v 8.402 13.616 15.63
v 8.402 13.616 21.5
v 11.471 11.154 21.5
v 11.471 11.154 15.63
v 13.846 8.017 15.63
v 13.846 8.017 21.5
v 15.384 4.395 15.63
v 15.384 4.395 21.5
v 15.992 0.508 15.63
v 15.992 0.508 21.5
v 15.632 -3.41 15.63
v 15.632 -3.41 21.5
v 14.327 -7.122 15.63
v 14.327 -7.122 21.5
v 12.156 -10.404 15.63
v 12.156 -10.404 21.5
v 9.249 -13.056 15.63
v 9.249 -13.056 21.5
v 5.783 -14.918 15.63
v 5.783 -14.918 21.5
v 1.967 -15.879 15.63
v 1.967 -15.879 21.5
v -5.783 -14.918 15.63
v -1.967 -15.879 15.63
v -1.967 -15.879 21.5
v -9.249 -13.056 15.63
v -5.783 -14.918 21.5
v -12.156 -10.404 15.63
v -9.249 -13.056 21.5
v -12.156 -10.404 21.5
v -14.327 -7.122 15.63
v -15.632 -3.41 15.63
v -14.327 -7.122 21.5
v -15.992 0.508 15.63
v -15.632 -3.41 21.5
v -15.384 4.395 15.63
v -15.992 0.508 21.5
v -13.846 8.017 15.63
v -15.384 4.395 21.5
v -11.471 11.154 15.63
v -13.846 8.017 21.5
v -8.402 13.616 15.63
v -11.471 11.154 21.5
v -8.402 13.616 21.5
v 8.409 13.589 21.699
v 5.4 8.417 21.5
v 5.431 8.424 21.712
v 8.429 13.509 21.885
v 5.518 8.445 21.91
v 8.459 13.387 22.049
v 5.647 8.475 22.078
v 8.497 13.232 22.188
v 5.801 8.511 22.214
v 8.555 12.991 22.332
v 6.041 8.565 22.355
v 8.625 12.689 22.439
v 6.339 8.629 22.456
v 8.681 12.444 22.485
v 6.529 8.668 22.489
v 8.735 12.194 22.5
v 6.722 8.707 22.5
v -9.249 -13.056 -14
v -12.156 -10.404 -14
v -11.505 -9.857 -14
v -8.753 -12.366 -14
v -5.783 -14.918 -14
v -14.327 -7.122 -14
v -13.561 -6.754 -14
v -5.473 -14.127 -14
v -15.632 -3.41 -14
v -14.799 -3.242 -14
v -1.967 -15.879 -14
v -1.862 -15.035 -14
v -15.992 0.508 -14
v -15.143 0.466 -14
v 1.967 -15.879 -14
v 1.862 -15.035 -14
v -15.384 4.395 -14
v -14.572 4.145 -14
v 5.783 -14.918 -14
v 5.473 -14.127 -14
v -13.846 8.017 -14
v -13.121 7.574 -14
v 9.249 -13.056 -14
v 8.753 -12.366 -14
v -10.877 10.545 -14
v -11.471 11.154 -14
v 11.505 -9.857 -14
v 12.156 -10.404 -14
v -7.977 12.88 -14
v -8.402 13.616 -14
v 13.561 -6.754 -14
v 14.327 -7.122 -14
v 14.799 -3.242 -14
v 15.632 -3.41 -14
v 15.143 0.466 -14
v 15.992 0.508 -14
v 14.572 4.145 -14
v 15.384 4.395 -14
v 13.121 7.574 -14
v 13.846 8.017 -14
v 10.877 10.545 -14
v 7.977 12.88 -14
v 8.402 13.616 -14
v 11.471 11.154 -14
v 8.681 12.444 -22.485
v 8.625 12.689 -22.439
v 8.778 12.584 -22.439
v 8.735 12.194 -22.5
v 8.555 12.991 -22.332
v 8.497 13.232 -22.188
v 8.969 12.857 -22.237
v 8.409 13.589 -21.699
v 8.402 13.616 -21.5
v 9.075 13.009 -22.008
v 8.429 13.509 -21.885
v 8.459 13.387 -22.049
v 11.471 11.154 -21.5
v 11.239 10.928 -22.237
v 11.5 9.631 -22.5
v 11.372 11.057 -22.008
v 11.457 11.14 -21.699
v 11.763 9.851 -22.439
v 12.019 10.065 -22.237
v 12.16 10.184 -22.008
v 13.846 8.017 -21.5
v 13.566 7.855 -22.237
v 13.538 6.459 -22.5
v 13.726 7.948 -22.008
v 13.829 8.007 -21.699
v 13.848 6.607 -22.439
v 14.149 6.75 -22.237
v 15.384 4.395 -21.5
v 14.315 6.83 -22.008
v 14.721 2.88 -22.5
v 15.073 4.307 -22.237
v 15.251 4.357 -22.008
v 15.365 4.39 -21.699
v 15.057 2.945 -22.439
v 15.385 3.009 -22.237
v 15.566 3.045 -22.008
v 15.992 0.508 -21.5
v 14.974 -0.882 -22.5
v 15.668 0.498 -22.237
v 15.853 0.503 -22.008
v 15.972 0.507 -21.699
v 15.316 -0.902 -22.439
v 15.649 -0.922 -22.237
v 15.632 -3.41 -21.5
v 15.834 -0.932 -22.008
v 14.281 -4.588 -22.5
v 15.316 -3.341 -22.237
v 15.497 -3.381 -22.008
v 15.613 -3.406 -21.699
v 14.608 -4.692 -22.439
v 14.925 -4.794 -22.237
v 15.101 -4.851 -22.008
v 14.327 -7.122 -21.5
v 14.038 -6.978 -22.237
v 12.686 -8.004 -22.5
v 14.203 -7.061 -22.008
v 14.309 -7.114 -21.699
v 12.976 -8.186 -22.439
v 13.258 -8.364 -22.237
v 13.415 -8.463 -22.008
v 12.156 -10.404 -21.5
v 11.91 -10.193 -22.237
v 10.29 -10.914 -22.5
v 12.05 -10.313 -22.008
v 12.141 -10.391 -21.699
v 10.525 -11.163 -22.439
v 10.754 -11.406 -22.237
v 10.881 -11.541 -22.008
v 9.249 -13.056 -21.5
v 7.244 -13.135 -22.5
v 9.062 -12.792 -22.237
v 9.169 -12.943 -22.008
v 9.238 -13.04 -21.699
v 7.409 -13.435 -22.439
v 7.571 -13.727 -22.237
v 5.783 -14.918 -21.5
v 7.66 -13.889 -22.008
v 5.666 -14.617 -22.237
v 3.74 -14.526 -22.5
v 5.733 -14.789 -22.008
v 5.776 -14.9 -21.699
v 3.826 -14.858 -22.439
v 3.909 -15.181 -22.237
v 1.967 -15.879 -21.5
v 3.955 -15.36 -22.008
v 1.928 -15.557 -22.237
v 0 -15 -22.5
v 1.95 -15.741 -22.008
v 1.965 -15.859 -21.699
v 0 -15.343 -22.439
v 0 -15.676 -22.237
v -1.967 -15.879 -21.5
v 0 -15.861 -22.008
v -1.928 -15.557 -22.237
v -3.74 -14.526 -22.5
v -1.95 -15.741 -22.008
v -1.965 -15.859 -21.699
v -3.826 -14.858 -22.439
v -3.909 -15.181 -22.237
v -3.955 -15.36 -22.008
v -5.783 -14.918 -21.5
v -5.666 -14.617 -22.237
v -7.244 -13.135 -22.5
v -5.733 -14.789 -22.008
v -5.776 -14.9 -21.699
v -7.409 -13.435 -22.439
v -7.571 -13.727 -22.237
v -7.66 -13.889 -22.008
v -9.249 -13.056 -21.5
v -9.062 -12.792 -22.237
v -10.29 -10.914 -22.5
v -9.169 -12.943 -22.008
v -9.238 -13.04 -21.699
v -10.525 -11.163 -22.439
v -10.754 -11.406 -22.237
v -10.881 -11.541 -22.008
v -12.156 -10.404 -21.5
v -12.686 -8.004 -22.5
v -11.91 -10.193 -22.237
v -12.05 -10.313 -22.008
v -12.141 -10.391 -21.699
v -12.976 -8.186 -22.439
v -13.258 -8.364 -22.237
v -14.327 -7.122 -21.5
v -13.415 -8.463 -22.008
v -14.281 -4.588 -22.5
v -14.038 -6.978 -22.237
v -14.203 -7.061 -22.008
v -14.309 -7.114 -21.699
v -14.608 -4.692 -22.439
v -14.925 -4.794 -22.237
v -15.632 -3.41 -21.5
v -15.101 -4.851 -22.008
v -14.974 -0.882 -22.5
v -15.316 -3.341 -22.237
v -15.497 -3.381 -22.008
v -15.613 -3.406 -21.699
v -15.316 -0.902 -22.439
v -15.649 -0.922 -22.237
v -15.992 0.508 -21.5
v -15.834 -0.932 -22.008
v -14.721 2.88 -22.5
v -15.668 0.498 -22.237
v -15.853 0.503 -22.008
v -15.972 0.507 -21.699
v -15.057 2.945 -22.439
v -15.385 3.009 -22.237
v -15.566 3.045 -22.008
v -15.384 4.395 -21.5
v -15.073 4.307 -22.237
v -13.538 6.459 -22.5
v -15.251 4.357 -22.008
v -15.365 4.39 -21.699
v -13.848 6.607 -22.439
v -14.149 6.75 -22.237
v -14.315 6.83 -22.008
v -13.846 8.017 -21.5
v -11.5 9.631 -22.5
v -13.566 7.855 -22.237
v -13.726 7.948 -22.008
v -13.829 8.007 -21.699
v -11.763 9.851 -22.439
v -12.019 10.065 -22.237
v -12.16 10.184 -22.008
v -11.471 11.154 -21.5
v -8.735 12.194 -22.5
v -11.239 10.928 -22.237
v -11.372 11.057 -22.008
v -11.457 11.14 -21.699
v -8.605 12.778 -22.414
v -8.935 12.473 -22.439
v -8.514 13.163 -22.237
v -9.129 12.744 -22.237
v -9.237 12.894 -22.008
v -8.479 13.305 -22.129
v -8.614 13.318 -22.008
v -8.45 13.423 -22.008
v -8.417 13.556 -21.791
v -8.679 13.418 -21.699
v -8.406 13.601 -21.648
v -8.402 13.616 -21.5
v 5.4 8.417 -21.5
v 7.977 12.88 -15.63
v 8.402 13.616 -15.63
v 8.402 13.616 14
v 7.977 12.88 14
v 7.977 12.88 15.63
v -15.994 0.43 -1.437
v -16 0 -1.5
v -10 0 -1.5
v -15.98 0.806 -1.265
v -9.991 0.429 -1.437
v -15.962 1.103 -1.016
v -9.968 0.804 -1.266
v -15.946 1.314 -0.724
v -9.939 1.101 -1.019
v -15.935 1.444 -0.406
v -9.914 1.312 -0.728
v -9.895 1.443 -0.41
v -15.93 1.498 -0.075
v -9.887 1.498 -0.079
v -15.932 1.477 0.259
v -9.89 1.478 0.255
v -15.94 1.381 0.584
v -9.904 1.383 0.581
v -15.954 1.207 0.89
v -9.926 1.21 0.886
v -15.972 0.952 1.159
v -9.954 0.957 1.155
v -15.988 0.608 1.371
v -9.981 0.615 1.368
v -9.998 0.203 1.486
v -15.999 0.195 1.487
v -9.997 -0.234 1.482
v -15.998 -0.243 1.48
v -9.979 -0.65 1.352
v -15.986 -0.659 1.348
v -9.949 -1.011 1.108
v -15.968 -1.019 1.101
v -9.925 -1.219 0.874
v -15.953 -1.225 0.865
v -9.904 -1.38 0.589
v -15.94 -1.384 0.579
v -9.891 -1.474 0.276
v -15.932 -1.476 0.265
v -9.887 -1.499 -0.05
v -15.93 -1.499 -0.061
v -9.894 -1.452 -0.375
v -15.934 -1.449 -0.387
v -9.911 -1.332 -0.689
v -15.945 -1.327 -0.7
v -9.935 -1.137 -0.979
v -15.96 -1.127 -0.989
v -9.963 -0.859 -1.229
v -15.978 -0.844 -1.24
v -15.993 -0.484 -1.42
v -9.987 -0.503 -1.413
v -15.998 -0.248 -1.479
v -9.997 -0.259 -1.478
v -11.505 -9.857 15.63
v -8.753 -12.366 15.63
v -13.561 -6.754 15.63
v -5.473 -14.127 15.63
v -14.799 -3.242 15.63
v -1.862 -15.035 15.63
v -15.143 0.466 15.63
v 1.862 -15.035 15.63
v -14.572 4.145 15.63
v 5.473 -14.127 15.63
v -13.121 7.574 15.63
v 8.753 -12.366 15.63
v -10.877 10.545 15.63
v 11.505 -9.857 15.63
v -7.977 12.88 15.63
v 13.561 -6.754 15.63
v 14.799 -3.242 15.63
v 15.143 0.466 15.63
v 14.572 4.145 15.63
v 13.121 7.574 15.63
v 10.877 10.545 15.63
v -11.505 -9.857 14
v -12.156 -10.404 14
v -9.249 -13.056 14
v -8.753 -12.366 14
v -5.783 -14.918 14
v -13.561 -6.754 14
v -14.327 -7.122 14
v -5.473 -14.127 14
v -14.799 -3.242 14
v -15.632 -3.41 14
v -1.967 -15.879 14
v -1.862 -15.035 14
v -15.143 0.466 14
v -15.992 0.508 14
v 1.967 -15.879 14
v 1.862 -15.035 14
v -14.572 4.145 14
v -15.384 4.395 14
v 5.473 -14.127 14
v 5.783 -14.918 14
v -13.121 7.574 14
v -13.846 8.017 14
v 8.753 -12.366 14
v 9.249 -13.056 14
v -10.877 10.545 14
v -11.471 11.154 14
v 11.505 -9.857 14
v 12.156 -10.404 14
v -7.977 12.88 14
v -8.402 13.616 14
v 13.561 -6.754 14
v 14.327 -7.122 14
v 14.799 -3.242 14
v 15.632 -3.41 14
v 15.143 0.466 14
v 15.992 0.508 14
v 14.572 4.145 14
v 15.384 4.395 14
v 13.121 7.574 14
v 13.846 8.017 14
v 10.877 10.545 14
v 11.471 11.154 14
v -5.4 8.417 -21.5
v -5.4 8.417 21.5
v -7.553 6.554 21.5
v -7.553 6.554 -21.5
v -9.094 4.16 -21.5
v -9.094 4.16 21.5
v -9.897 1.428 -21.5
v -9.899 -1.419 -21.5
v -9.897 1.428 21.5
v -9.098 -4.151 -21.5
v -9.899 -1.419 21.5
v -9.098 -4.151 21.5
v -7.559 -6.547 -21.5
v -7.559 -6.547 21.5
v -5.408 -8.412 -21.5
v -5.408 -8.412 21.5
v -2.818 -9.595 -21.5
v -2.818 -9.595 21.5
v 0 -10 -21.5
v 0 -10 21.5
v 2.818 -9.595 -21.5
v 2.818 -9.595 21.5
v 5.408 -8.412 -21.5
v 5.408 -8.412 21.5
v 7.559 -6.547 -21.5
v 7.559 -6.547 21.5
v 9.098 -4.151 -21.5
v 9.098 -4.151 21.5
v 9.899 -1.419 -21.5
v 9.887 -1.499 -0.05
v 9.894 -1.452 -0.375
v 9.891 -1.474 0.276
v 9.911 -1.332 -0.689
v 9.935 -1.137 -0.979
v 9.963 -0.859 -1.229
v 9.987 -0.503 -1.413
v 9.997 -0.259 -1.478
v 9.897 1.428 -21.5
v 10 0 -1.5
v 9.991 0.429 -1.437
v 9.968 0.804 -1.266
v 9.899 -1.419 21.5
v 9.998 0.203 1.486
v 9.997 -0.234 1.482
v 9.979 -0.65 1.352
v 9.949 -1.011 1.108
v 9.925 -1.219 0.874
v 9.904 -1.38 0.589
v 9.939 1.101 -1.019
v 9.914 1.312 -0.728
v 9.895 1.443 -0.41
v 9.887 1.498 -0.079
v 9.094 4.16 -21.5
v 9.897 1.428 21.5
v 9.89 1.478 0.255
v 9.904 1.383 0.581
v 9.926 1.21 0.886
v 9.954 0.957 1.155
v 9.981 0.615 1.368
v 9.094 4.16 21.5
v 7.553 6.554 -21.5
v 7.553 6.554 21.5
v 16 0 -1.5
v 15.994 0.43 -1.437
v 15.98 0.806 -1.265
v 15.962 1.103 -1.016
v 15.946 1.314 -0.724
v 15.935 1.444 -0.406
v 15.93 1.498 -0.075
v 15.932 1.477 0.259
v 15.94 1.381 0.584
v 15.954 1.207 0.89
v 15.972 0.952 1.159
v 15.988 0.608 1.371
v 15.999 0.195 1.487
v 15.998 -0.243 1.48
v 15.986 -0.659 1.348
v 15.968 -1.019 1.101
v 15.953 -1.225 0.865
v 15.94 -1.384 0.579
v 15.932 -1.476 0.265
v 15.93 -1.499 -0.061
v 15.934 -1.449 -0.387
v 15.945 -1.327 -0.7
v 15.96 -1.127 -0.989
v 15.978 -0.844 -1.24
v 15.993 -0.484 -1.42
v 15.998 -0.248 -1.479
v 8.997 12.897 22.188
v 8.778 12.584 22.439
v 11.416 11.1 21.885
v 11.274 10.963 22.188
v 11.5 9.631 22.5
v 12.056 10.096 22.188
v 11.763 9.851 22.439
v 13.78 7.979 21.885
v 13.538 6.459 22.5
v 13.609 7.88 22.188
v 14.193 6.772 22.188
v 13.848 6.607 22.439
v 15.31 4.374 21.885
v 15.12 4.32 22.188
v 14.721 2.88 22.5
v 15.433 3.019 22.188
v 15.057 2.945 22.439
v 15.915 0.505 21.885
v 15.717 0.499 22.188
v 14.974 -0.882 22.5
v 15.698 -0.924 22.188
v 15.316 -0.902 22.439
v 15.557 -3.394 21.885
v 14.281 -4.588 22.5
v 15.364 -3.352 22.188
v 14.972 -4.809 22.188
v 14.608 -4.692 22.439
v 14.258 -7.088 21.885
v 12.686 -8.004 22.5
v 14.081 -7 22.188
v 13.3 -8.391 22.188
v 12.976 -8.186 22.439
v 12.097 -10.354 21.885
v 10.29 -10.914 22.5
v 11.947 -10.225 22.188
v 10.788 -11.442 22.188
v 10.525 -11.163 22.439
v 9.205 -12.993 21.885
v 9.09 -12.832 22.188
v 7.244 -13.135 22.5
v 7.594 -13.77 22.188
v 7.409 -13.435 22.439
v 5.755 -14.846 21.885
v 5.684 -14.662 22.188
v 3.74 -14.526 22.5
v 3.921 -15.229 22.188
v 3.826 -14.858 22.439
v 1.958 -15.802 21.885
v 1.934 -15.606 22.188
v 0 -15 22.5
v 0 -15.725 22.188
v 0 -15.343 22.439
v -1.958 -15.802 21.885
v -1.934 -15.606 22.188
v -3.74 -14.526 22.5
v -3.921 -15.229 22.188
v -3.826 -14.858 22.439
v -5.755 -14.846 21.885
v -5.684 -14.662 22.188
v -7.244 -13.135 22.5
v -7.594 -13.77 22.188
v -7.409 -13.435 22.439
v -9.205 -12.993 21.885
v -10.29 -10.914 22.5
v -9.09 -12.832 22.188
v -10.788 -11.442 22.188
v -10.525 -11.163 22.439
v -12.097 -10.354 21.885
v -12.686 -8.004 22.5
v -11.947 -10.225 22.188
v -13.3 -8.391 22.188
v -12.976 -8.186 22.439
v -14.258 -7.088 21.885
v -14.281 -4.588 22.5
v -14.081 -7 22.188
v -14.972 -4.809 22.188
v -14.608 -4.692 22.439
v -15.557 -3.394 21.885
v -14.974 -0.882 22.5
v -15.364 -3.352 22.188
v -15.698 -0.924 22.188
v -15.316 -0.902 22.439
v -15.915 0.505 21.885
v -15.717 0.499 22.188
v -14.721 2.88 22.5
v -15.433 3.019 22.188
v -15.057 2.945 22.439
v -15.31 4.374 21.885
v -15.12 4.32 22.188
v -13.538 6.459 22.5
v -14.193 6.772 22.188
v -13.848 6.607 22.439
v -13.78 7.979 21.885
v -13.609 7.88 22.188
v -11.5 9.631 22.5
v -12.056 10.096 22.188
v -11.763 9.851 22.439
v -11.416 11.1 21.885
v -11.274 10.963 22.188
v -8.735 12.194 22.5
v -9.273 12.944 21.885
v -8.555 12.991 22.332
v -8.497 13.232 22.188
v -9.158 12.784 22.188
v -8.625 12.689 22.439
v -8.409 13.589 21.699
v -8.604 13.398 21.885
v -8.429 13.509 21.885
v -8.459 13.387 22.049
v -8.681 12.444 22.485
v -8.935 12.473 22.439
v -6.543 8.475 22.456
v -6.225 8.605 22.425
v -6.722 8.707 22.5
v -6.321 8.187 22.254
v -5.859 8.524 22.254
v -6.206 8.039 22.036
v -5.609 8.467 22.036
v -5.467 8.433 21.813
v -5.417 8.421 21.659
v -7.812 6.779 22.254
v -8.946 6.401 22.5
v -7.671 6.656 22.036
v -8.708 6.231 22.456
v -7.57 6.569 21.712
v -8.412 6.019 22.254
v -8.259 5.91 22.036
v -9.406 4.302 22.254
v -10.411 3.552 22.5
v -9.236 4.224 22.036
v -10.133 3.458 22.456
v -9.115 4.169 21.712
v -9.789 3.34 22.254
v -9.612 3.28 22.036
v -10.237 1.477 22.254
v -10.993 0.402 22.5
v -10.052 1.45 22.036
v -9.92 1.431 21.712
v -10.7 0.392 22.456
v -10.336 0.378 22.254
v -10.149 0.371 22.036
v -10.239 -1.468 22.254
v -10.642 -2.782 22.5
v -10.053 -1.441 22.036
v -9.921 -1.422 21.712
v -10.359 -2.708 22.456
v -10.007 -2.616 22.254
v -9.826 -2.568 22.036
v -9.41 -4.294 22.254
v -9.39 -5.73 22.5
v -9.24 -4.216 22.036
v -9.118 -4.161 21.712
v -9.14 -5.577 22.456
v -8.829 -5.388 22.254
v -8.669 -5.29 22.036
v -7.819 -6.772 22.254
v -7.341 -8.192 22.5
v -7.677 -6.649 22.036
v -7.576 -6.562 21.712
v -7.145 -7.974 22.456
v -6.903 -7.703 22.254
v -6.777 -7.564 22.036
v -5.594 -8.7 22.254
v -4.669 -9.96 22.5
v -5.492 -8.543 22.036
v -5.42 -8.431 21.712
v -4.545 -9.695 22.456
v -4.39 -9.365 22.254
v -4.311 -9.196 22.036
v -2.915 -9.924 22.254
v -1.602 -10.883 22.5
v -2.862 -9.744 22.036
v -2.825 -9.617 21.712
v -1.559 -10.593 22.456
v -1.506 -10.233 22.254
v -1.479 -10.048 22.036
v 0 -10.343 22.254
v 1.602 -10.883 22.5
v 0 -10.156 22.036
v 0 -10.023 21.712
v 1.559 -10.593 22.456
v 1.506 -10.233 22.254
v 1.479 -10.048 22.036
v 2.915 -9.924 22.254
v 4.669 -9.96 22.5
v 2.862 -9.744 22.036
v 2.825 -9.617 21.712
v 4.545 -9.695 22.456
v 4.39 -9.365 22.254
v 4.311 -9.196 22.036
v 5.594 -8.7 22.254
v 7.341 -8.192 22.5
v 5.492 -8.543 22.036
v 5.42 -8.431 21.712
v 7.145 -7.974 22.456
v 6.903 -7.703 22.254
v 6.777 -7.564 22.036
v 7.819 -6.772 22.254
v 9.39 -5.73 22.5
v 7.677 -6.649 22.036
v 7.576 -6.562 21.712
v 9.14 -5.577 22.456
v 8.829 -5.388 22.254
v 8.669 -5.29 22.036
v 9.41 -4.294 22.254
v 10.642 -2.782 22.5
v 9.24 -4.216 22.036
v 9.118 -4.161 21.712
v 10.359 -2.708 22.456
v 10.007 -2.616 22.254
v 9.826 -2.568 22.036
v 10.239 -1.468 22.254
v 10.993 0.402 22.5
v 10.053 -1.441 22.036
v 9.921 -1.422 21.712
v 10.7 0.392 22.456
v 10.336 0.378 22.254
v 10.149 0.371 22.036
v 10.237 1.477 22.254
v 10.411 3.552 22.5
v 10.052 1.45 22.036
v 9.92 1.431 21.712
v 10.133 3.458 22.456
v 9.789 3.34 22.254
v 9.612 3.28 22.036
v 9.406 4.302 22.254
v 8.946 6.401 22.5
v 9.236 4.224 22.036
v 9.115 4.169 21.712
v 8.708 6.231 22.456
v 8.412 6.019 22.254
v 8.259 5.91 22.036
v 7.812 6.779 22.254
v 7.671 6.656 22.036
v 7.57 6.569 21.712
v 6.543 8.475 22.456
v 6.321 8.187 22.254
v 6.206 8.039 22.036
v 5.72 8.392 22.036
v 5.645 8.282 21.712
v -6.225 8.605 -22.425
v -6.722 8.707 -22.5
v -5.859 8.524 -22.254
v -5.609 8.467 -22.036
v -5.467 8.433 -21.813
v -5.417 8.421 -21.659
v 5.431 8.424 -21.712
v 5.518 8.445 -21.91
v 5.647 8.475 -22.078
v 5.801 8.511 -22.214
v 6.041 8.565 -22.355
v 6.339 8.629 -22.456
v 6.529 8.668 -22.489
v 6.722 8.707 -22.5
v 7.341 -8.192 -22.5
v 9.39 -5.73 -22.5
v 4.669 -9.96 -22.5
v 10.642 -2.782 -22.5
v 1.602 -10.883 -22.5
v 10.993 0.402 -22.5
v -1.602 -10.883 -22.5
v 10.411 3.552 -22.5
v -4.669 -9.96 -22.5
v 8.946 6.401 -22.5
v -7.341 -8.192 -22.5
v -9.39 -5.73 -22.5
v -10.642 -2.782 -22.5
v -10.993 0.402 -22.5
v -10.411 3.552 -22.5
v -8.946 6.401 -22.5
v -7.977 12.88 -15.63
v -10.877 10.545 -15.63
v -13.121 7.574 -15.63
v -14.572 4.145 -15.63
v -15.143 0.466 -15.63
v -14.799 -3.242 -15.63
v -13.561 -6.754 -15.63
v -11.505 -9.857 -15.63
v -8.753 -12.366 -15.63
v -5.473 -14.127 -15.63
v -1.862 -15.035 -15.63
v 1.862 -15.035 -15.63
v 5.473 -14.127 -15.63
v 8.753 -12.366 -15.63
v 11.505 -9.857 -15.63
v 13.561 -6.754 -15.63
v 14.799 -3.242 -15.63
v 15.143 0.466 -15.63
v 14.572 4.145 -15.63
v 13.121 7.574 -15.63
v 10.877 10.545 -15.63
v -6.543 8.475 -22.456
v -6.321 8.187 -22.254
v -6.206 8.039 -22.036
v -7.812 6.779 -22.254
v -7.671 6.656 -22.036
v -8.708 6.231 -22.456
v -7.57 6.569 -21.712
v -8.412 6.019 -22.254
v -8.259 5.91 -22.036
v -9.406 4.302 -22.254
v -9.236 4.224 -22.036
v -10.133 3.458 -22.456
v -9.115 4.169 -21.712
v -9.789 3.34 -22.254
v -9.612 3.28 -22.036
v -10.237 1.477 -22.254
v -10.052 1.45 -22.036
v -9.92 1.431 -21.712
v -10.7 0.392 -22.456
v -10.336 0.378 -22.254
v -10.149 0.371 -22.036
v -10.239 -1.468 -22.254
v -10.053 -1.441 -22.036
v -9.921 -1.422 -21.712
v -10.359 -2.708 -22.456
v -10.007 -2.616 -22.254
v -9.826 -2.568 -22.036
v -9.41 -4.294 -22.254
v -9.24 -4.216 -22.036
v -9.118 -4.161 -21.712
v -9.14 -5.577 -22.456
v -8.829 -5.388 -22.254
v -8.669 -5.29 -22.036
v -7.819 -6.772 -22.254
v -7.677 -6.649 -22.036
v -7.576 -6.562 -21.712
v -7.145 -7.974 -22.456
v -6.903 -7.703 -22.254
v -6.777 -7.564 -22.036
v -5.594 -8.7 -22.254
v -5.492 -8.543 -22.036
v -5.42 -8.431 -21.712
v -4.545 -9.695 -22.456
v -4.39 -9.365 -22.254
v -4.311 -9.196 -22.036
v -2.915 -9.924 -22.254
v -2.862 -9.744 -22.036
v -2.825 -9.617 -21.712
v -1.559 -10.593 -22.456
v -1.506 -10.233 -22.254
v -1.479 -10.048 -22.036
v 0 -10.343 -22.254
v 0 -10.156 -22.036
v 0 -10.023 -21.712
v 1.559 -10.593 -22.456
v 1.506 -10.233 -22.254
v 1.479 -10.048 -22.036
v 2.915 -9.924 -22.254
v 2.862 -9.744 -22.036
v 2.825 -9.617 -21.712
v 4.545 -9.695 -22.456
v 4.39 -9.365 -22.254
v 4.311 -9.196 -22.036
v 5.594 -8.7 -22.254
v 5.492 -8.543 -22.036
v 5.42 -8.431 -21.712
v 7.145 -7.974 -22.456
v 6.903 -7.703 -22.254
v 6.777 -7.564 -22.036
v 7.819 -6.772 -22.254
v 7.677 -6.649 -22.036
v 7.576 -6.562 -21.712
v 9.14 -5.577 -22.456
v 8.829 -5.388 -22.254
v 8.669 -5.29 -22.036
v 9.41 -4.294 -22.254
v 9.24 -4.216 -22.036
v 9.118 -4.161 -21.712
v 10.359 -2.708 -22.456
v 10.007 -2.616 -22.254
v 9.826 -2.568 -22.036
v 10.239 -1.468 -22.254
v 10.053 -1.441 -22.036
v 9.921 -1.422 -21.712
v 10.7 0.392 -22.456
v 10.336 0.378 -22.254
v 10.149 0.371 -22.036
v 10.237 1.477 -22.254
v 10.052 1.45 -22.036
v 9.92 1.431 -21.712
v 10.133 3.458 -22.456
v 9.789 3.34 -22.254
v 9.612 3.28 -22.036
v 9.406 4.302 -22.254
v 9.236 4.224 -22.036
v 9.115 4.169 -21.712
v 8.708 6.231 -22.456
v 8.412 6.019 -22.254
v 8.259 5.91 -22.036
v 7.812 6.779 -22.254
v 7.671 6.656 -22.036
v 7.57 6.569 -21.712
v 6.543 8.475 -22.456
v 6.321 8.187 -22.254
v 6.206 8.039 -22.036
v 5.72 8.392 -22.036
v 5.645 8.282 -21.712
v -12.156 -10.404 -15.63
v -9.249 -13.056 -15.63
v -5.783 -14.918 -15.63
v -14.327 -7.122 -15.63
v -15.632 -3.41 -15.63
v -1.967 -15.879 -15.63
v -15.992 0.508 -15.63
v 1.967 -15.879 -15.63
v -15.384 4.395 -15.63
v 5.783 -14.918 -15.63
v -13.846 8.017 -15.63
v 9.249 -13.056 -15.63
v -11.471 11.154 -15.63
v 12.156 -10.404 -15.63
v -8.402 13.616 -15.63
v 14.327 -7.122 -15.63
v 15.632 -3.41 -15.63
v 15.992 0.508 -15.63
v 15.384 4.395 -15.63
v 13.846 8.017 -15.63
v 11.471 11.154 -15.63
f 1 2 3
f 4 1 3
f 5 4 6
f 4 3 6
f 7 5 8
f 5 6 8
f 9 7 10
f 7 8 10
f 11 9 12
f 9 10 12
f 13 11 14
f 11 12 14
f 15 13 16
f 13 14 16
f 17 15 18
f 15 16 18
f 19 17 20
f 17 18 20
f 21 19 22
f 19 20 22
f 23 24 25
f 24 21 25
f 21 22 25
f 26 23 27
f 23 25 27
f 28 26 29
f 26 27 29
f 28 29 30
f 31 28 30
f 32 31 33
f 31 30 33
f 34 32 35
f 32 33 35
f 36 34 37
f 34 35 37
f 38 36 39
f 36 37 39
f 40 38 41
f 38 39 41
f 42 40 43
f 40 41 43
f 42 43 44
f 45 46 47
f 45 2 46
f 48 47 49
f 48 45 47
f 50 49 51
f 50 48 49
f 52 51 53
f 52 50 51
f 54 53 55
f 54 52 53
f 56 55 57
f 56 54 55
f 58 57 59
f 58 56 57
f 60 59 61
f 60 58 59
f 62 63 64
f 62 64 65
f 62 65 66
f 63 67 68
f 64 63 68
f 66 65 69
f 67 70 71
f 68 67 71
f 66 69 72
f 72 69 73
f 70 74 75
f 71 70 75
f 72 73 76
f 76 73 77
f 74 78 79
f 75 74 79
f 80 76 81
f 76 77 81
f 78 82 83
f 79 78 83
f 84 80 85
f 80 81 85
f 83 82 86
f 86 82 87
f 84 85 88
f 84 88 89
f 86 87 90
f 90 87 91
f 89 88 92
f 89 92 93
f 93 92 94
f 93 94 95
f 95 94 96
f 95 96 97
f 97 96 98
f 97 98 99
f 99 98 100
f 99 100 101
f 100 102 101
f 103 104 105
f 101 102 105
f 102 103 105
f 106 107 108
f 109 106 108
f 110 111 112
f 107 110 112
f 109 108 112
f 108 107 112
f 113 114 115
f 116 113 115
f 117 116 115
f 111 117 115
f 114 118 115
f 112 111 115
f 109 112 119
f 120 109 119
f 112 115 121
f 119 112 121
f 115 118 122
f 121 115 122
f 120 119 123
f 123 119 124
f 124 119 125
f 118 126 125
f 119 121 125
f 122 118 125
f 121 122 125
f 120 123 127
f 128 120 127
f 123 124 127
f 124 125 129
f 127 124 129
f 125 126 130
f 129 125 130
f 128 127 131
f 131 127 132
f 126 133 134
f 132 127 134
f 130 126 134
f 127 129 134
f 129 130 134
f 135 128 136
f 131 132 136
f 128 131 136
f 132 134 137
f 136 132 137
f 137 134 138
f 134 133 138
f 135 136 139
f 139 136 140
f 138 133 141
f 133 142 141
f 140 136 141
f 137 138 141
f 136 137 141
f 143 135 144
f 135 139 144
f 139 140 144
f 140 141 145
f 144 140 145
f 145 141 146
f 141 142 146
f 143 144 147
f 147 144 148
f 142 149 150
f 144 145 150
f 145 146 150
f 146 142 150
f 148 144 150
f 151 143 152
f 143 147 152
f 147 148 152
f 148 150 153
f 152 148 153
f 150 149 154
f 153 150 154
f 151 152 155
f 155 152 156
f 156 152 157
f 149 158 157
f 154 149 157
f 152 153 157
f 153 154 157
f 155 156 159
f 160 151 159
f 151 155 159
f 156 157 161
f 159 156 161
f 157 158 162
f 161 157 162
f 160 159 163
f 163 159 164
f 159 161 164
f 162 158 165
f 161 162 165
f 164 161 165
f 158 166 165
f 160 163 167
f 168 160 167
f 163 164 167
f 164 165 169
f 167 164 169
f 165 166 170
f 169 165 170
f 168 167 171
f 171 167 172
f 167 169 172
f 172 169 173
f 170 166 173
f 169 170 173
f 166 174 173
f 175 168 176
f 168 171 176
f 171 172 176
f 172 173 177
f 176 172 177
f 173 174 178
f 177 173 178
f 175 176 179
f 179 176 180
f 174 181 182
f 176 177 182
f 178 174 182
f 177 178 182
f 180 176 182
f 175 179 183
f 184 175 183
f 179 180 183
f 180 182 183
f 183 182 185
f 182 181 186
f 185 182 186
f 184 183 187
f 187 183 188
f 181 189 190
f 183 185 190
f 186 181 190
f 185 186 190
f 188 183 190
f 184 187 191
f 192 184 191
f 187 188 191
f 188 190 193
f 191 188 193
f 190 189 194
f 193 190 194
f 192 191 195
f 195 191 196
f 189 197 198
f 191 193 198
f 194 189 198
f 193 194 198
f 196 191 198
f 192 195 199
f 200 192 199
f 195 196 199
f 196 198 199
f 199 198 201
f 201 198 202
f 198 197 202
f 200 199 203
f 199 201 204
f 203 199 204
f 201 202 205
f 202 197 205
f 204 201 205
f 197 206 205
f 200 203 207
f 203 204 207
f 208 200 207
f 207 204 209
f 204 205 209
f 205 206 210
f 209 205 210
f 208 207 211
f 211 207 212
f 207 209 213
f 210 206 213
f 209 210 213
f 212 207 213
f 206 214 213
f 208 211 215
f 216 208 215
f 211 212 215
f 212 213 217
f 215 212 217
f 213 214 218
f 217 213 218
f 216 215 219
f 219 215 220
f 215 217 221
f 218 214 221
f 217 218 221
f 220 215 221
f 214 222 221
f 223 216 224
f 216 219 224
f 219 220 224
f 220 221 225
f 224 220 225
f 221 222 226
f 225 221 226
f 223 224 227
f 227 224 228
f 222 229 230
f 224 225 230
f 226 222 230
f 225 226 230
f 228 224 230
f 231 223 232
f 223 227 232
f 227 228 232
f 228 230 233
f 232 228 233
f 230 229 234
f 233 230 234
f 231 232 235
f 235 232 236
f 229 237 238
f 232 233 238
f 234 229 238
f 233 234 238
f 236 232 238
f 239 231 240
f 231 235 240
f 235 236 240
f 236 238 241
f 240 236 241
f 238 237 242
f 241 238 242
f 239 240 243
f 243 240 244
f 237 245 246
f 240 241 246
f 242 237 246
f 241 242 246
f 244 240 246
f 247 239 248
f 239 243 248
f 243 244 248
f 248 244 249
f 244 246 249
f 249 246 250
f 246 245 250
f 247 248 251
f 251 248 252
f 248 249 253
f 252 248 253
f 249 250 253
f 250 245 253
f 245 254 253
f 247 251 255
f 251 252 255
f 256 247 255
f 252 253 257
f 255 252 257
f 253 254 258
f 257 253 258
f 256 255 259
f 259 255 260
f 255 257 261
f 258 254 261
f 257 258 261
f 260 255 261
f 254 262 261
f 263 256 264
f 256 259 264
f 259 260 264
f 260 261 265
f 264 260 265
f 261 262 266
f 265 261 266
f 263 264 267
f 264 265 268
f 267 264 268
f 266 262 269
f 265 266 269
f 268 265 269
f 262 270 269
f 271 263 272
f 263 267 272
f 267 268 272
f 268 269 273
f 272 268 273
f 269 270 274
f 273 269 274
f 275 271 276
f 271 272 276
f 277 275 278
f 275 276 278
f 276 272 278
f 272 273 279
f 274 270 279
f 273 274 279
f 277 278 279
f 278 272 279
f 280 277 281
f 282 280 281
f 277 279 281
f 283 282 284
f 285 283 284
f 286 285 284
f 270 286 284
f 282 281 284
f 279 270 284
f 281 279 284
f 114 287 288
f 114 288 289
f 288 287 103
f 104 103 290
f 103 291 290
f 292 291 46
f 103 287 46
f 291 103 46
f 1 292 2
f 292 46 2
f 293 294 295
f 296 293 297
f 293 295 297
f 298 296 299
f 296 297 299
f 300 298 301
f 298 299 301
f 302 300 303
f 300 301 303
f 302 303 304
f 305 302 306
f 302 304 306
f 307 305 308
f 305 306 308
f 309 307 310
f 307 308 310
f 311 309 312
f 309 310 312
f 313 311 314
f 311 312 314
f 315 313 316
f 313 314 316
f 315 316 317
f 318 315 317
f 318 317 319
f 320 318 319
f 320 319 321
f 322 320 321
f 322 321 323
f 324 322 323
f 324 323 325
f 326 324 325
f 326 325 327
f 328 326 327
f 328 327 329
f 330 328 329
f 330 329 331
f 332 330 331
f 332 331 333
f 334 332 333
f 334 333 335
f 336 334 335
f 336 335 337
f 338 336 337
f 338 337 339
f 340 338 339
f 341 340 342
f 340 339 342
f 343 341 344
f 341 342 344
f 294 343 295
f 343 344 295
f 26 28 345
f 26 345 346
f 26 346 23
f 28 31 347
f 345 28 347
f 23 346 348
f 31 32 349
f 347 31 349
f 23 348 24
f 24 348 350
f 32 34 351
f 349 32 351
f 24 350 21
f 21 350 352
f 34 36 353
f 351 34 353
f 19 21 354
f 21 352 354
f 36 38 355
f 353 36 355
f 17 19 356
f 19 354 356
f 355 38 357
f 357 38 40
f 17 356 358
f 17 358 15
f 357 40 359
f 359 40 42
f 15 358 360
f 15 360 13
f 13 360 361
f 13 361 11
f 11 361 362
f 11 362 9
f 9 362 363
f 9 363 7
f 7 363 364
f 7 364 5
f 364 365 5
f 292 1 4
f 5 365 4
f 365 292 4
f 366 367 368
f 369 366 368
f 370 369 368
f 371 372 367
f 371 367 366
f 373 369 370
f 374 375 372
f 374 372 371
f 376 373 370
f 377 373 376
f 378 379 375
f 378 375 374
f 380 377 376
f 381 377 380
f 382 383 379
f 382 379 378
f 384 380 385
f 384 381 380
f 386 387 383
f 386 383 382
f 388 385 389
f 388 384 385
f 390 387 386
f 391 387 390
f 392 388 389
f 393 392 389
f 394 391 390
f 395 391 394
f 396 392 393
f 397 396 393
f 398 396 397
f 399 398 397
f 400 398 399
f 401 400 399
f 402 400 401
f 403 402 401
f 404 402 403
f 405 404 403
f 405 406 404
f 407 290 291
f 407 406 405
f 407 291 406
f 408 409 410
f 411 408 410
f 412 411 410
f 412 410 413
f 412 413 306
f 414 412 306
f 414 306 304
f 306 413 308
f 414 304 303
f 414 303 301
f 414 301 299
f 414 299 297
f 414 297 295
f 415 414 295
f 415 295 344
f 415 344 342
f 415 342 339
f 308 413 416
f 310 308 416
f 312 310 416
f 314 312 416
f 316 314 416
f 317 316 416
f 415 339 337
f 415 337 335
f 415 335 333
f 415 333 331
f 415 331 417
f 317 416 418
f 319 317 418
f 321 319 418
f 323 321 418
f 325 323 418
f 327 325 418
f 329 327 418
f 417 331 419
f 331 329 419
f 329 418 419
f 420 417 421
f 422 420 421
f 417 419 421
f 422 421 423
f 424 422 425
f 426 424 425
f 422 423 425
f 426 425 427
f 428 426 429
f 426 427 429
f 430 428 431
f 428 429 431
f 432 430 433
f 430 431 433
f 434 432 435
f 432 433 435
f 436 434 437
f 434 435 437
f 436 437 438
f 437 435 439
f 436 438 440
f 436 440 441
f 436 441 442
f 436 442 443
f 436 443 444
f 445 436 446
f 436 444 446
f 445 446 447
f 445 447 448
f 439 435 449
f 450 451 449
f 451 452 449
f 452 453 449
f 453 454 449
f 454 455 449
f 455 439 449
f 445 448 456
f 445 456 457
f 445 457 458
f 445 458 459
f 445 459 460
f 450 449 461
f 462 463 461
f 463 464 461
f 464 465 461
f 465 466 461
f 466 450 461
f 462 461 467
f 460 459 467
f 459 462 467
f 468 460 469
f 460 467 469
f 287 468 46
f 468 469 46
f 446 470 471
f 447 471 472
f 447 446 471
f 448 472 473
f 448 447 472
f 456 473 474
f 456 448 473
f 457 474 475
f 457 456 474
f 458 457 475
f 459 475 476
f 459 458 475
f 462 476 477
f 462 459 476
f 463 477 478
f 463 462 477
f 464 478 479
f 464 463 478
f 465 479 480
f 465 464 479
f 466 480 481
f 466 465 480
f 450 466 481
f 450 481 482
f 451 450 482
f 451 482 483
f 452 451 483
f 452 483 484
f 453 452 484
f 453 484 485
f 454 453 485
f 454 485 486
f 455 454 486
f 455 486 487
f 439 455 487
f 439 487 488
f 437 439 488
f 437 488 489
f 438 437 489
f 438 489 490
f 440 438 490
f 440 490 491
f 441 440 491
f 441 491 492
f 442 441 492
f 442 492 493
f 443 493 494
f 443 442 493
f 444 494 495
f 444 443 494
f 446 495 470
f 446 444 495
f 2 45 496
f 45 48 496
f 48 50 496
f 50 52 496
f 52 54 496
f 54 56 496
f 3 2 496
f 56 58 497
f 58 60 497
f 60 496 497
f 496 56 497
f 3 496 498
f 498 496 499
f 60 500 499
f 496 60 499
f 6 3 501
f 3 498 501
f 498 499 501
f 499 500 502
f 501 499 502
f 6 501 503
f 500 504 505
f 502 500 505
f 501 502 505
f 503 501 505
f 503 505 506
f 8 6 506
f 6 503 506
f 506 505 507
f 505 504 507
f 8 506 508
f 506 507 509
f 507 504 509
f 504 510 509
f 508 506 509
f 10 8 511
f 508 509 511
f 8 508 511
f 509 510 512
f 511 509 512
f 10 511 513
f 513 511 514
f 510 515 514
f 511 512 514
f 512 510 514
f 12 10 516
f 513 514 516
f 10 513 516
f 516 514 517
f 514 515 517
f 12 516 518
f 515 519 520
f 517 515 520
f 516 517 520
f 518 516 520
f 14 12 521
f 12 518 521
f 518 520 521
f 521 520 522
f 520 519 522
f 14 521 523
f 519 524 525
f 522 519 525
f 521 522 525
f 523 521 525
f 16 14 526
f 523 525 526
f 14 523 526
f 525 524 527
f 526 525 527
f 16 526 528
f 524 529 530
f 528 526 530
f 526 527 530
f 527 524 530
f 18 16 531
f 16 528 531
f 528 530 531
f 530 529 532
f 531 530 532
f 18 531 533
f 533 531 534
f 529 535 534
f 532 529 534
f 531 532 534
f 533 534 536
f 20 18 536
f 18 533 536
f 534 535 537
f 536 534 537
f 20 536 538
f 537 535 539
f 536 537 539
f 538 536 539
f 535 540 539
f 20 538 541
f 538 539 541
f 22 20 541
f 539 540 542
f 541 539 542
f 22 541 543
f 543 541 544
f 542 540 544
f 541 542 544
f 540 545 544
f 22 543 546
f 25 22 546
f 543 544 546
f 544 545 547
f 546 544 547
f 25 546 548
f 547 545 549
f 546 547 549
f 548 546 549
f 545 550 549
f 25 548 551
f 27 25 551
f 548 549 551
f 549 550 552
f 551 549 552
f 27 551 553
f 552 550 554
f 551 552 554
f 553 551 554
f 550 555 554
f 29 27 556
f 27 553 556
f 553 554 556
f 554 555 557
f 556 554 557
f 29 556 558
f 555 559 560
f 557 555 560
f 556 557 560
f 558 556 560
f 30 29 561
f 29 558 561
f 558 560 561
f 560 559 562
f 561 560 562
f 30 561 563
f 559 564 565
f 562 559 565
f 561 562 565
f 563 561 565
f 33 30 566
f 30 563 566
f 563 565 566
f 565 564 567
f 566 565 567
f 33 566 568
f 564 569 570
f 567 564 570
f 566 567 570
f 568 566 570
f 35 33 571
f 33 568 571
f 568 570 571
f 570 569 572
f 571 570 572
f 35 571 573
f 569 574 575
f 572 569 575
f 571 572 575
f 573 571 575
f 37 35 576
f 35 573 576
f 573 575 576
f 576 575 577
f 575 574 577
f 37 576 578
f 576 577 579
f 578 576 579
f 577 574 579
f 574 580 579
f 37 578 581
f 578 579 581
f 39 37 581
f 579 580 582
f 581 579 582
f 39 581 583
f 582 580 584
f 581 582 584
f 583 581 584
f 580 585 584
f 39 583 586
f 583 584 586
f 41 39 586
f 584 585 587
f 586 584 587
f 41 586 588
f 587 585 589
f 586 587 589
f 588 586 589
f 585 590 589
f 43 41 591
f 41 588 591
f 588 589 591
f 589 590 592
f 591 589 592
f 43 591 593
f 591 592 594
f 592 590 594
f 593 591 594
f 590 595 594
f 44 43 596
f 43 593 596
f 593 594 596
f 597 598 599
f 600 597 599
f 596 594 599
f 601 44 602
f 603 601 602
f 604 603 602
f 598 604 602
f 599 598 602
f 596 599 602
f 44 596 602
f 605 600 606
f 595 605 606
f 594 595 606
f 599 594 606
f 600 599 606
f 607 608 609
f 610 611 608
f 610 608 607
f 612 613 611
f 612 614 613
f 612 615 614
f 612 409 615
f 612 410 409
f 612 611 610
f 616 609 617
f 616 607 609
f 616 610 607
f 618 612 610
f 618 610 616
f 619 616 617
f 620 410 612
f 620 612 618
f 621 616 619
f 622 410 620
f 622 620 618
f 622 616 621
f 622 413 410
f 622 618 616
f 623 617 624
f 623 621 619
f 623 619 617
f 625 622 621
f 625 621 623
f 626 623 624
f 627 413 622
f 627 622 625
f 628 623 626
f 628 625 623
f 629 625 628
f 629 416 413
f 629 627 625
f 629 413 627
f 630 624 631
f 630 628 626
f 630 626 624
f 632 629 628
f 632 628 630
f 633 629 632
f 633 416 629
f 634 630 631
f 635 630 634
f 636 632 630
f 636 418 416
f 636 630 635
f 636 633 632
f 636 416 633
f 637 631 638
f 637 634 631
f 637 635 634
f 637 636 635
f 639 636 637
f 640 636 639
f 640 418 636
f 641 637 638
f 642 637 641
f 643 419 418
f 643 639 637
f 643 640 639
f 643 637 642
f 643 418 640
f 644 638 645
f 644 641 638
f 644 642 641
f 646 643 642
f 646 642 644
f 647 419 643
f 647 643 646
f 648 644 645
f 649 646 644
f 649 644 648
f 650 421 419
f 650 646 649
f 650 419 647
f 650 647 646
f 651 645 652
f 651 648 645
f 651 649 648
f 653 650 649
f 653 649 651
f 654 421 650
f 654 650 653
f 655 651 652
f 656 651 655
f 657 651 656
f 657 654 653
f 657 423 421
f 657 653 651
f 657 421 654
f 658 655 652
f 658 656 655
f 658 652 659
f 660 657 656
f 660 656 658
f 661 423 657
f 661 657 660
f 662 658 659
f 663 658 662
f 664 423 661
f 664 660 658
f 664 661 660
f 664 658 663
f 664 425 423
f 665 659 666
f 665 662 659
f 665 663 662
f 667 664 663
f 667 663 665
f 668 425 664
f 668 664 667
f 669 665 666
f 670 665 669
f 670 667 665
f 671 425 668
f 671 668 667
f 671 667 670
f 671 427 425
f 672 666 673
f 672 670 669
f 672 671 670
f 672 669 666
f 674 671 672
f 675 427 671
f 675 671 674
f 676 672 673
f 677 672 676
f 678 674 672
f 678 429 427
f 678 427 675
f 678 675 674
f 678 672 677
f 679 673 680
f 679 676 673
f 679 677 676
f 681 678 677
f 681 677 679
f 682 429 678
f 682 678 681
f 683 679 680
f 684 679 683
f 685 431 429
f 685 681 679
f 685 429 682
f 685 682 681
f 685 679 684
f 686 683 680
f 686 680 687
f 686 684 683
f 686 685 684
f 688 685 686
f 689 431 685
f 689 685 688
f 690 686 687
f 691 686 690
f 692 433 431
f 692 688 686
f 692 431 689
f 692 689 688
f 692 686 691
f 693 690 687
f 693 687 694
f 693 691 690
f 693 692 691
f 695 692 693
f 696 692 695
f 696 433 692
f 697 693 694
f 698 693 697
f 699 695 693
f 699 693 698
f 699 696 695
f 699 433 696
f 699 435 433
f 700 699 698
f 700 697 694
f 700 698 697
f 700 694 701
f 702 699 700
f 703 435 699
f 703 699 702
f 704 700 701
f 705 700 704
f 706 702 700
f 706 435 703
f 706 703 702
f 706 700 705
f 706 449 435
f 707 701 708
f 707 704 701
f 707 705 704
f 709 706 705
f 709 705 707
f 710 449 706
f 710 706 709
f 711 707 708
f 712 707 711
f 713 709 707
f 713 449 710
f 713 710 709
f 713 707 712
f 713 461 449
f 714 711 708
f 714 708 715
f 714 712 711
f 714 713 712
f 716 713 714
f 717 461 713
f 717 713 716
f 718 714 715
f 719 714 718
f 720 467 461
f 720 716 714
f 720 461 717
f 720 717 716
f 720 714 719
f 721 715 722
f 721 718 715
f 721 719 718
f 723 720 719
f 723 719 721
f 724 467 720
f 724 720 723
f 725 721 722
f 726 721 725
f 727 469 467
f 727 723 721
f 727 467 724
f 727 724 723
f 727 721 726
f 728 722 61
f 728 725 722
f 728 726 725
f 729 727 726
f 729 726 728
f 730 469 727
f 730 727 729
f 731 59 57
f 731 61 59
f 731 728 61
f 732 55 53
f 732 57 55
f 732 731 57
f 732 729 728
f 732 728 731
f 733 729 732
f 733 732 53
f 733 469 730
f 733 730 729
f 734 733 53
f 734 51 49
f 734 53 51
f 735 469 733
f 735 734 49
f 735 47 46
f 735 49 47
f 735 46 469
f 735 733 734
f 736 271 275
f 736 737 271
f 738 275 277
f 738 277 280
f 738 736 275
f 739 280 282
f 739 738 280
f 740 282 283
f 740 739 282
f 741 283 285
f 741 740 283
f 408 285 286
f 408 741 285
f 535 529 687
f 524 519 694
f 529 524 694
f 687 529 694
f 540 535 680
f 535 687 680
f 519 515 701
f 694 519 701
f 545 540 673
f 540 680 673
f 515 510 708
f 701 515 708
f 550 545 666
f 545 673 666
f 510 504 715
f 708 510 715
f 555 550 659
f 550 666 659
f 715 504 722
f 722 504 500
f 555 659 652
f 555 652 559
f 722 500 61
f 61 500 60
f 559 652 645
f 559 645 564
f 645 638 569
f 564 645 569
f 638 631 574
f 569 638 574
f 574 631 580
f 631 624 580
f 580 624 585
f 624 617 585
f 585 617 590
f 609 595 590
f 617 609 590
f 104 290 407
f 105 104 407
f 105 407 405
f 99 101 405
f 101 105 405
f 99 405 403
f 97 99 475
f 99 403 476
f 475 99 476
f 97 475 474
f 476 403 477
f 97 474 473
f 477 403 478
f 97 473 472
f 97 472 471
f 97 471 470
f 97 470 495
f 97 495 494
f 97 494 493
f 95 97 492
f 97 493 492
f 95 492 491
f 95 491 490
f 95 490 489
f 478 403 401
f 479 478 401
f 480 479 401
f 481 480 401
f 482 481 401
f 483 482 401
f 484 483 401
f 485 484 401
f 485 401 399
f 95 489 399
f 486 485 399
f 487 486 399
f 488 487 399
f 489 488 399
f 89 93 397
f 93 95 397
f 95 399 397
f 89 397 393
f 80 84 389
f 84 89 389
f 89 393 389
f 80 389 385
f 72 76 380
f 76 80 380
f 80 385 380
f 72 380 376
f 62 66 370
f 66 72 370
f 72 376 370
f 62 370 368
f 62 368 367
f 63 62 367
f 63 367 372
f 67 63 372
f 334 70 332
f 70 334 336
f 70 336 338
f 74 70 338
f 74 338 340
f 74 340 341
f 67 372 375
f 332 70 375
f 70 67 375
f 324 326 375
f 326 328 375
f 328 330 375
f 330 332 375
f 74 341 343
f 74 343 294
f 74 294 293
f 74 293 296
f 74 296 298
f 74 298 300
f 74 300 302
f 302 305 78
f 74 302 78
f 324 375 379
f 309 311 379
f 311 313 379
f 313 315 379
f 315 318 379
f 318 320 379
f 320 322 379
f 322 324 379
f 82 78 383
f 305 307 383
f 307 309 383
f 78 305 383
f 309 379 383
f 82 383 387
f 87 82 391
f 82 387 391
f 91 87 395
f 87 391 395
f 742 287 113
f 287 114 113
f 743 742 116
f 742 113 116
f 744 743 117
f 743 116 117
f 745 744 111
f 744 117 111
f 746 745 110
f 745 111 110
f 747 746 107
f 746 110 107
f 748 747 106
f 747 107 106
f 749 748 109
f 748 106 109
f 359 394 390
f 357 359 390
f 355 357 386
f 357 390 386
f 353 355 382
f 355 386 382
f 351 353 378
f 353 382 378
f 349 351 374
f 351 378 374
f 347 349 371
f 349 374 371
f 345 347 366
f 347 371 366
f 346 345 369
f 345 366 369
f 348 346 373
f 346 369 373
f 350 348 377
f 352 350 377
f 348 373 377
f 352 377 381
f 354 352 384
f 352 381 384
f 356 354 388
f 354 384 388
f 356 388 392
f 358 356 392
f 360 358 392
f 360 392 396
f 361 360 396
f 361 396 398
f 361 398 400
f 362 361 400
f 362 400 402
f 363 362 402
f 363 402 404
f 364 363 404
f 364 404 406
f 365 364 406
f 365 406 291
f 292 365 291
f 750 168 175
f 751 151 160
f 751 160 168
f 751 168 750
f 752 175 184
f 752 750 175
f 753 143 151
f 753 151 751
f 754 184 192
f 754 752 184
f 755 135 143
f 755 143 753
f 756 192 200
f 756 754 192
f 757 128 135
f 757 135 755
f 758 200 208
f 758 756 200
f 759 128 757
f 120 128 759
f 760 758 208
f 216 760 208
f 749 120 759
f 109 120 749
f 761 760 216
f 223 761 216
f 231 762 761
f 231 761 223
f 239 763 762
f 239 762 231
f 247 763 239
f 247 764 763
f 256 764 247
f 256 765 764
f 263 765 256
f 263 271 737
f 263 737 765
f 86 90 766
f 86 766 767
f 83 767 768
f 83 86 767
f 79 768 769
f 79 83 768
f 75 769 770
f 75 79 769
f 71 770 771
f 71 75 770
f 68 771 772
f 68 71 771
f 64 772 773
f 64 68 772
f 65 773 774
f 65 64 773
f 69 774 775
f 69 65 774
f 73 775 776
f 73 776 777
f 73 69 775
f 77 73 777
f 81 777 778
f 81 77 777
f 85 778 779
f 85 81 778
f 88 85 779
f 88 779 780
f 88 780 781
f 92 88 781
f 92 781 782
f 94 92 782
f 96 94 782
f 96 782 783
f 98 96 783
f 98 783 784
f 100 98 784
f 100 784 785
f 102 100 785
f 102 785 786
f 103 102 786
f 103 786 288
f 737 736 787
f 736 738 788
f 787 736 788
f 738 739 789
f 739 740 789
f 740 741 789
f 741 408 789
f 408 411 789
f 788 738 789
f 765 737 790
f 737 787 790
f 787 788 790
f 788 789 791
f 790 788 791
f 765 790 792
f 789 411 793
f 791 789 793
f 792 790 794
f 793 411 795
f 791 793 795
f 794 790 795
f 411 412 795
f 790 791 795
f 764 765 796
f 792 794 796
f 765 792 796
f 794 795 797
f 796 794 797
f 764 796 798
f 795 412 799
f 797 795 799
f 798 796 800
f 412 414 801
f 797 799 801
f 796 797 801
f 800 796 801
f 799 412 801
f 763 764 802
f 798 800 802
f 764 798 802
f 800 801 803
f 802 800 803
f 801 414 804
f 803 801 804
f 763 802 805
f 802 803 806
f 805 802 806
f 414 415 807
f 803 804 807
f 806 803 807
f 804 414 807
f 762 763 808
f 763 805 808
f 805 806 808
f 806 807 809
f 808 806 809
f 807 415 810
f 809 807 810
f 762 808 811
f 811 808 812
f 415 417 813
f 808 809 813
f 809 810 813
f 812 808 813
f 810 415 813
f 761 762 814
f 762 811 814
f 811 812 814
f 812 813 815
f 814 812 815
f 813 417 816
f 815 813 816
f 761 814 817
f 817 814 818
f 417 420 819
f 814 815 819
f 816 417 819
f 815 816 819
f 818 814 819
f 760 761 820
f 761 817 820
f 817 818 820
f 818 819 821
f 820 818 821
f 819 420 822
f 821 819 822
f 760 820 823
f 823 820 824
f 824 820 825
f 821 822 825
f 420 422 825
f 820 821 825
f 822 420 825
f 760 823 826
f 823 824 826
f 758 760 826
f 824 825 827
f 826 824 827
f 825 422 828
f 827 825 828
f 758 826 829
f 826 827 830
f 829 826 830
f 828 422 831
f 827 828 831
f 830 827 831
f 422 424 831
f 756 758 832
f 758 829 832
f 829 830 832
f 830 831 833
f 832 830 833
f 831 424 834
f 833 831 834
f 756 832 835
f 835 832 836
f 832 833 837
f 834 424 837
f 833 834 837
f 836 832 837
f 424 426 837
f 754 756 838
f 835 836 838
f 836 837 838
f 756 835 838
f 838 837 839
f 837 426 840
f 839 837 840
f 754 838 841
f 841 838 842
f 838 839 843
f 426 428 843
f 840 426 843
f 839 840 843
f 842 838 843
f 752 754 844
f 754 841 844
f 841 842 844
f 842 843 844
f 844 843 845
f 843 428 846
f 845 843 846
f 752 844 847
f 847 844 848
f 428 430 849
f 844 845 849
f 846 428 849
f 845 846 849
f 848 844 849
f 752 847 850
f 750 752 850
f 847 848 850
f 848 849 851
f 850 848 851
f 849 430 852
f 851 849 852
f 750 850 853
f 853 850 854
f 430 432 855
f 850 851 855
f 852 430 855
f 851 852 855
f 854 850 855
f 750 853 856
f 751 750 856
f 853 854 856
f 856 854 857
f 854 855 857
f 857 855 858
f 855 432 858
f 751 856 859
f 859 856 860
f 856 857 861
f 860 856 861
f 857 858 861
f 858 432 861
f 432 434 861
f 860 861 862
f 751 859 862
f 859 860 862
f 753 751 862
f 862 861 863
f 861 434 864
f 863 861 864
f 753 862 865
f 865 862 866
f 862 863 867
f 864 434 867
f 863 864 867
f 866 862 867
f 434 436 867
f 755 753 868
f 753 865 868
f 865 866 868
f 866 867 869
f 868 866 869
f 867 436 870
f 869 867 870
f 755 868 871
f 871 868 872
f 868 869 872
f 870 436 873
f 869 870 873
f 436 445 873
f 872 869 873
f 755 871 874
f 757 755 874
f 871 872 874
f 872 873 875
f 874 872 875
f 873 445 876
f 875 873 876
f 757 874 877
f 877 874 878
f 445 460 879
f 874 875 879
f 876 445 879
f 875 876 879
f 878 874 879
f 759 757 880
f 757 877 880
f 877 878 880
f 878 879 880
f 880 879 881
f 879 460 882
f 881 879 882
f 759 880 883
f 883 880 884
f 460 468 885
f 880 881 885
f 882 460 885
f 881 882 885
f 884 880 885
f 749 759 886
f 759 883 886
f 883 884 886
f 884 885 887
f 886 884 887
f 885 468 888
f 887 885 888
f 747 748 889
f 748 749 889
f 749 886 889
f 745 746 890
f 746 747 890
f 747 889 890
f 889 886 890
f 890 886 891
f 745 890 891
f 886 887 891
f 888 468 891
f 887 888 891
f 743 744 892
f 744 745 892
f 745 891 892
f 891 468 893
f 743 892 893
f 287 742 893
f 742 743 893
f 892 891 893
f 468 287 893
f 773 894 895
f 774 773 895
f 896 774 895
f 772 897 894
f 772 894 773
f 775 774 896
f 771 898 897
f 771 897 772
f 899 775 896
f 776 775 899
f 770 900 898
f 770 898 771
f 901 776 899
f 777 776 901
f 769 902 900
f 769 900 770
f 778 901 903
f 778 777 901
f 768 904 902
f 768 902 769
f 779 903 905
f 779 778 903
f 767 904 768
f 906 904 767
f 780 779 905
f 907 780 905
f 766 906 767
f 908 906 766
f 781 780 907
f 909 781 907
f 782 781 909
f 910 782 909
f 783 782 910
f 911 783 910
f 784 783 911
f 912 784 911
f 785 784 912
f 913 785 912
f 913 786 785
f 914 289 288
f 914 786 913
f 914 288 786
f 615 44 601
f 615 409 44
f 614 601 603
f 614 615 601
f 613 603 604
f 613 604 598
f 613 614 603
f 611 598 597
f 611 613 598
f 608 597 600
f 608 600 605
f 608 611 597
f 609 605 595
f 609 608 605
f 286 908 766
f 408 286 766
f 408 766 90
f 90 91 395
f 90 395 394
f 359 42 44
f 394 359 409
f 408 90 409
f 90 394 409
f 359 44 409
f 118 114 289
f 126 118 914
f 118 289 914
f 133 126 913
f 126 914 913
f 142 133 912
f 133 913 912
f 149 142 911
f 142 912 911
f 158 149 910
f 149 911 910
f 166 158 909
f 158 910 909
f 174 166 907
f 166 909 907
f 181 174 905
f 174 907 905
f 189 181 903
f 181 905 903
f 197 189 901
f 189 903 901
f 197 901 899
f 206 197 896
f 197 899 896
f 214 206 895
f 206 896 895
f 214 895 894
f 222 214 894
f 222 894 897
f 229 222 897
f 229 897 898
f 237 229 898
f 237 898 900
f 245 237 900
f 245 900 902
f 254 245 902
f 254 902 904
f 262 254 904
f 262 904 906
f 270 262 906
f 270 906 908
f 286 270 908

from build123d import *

# Parameters (mm, degrees)
EXTRUDE1_DEPTH      = 22.5
SKETCH2_R           = 16
SKETCH2_R_2         = 15.15
EXTRUDE2_DEPTH      = 1.63
FILLET1_R           = 1
SKETCH3_R           = 1.5
EXTRUDE3_DEPTH      = 17.0000001
EXTRUDE3_DEPTH_BACK = 17.0000001


with BuildPart() as part:
    # Sketch1 → Extrude1 (new body, symmetric)
    with BuildSketch(Plane.XY):
        with BuildLine():
            Line((5.4, 8.416650165), (8.402057485, 13.616366256))
            ThreePointArc((8.402057485, 13.616366256), (0, -16), (-8.402057485, 13.616366256))
            Line((-8.402057485, 13.616366256), (-5.4, 8.416650165))
            ThreePointArc((-5.4, 8.416650165), (0, -10), (5.4, 8.416650165))
        make_face()
    extrude(amount=EXTRUDE1_DEPTH, both=True)

    # Sketch2 → Extrude2 (cut)
    with BuildSketch(Plane.XY.offset(14)):
        Circle(SKETCH2_R)
        Circle(SKETCH2_R_2, mode=Mode.SUBTRACT)
    extrude2 = extrude(amount=EXTRUDE2_DEPTH, mode=Mode.SUBTRACT)

    # Fillet1
    fillet1_edges = [part.edges().sort_by_distance(p)[0] for p in [
        (0, -16, 22.5),
        (6.901028742, 11.016508211, 22.5),
        (0, -10, 22.5),
        (6.901028742, 11.016508211, -22.5),
        (0, -16, -22.5),
        (-6.901028742, 11.016508211, -22.5),
        (0, -10, -22.5),
        (-6.901028742, 11.016508211, 22.5),
    ]]
    fillet(fillet1_edges, radius=FILLET1_R)

    # Mirror1: Extrude2 across plane
    add(extrude2.mirror(Plane.XY), mode=Mode.SUBTRACT)

    # Sketch3 → Extrude3 (cut, two sides)
    with BuildSketch(Plane(origin=(0, 0, 0), x_dir=(0, 0, -1), z_dir=(1, 0, 0))) as extrude3_sk:
        Circle(SKETCH3_R)
    extrude(amount=EXTRUDE3_DEPTH, mode=Mode.SUBTRACT)
    extrude(extrude3_sk.sketch, amount=-EXTRUDE3_DEPTH_BACK, mode=Mode.SUBTRACT)


solid = part.part
